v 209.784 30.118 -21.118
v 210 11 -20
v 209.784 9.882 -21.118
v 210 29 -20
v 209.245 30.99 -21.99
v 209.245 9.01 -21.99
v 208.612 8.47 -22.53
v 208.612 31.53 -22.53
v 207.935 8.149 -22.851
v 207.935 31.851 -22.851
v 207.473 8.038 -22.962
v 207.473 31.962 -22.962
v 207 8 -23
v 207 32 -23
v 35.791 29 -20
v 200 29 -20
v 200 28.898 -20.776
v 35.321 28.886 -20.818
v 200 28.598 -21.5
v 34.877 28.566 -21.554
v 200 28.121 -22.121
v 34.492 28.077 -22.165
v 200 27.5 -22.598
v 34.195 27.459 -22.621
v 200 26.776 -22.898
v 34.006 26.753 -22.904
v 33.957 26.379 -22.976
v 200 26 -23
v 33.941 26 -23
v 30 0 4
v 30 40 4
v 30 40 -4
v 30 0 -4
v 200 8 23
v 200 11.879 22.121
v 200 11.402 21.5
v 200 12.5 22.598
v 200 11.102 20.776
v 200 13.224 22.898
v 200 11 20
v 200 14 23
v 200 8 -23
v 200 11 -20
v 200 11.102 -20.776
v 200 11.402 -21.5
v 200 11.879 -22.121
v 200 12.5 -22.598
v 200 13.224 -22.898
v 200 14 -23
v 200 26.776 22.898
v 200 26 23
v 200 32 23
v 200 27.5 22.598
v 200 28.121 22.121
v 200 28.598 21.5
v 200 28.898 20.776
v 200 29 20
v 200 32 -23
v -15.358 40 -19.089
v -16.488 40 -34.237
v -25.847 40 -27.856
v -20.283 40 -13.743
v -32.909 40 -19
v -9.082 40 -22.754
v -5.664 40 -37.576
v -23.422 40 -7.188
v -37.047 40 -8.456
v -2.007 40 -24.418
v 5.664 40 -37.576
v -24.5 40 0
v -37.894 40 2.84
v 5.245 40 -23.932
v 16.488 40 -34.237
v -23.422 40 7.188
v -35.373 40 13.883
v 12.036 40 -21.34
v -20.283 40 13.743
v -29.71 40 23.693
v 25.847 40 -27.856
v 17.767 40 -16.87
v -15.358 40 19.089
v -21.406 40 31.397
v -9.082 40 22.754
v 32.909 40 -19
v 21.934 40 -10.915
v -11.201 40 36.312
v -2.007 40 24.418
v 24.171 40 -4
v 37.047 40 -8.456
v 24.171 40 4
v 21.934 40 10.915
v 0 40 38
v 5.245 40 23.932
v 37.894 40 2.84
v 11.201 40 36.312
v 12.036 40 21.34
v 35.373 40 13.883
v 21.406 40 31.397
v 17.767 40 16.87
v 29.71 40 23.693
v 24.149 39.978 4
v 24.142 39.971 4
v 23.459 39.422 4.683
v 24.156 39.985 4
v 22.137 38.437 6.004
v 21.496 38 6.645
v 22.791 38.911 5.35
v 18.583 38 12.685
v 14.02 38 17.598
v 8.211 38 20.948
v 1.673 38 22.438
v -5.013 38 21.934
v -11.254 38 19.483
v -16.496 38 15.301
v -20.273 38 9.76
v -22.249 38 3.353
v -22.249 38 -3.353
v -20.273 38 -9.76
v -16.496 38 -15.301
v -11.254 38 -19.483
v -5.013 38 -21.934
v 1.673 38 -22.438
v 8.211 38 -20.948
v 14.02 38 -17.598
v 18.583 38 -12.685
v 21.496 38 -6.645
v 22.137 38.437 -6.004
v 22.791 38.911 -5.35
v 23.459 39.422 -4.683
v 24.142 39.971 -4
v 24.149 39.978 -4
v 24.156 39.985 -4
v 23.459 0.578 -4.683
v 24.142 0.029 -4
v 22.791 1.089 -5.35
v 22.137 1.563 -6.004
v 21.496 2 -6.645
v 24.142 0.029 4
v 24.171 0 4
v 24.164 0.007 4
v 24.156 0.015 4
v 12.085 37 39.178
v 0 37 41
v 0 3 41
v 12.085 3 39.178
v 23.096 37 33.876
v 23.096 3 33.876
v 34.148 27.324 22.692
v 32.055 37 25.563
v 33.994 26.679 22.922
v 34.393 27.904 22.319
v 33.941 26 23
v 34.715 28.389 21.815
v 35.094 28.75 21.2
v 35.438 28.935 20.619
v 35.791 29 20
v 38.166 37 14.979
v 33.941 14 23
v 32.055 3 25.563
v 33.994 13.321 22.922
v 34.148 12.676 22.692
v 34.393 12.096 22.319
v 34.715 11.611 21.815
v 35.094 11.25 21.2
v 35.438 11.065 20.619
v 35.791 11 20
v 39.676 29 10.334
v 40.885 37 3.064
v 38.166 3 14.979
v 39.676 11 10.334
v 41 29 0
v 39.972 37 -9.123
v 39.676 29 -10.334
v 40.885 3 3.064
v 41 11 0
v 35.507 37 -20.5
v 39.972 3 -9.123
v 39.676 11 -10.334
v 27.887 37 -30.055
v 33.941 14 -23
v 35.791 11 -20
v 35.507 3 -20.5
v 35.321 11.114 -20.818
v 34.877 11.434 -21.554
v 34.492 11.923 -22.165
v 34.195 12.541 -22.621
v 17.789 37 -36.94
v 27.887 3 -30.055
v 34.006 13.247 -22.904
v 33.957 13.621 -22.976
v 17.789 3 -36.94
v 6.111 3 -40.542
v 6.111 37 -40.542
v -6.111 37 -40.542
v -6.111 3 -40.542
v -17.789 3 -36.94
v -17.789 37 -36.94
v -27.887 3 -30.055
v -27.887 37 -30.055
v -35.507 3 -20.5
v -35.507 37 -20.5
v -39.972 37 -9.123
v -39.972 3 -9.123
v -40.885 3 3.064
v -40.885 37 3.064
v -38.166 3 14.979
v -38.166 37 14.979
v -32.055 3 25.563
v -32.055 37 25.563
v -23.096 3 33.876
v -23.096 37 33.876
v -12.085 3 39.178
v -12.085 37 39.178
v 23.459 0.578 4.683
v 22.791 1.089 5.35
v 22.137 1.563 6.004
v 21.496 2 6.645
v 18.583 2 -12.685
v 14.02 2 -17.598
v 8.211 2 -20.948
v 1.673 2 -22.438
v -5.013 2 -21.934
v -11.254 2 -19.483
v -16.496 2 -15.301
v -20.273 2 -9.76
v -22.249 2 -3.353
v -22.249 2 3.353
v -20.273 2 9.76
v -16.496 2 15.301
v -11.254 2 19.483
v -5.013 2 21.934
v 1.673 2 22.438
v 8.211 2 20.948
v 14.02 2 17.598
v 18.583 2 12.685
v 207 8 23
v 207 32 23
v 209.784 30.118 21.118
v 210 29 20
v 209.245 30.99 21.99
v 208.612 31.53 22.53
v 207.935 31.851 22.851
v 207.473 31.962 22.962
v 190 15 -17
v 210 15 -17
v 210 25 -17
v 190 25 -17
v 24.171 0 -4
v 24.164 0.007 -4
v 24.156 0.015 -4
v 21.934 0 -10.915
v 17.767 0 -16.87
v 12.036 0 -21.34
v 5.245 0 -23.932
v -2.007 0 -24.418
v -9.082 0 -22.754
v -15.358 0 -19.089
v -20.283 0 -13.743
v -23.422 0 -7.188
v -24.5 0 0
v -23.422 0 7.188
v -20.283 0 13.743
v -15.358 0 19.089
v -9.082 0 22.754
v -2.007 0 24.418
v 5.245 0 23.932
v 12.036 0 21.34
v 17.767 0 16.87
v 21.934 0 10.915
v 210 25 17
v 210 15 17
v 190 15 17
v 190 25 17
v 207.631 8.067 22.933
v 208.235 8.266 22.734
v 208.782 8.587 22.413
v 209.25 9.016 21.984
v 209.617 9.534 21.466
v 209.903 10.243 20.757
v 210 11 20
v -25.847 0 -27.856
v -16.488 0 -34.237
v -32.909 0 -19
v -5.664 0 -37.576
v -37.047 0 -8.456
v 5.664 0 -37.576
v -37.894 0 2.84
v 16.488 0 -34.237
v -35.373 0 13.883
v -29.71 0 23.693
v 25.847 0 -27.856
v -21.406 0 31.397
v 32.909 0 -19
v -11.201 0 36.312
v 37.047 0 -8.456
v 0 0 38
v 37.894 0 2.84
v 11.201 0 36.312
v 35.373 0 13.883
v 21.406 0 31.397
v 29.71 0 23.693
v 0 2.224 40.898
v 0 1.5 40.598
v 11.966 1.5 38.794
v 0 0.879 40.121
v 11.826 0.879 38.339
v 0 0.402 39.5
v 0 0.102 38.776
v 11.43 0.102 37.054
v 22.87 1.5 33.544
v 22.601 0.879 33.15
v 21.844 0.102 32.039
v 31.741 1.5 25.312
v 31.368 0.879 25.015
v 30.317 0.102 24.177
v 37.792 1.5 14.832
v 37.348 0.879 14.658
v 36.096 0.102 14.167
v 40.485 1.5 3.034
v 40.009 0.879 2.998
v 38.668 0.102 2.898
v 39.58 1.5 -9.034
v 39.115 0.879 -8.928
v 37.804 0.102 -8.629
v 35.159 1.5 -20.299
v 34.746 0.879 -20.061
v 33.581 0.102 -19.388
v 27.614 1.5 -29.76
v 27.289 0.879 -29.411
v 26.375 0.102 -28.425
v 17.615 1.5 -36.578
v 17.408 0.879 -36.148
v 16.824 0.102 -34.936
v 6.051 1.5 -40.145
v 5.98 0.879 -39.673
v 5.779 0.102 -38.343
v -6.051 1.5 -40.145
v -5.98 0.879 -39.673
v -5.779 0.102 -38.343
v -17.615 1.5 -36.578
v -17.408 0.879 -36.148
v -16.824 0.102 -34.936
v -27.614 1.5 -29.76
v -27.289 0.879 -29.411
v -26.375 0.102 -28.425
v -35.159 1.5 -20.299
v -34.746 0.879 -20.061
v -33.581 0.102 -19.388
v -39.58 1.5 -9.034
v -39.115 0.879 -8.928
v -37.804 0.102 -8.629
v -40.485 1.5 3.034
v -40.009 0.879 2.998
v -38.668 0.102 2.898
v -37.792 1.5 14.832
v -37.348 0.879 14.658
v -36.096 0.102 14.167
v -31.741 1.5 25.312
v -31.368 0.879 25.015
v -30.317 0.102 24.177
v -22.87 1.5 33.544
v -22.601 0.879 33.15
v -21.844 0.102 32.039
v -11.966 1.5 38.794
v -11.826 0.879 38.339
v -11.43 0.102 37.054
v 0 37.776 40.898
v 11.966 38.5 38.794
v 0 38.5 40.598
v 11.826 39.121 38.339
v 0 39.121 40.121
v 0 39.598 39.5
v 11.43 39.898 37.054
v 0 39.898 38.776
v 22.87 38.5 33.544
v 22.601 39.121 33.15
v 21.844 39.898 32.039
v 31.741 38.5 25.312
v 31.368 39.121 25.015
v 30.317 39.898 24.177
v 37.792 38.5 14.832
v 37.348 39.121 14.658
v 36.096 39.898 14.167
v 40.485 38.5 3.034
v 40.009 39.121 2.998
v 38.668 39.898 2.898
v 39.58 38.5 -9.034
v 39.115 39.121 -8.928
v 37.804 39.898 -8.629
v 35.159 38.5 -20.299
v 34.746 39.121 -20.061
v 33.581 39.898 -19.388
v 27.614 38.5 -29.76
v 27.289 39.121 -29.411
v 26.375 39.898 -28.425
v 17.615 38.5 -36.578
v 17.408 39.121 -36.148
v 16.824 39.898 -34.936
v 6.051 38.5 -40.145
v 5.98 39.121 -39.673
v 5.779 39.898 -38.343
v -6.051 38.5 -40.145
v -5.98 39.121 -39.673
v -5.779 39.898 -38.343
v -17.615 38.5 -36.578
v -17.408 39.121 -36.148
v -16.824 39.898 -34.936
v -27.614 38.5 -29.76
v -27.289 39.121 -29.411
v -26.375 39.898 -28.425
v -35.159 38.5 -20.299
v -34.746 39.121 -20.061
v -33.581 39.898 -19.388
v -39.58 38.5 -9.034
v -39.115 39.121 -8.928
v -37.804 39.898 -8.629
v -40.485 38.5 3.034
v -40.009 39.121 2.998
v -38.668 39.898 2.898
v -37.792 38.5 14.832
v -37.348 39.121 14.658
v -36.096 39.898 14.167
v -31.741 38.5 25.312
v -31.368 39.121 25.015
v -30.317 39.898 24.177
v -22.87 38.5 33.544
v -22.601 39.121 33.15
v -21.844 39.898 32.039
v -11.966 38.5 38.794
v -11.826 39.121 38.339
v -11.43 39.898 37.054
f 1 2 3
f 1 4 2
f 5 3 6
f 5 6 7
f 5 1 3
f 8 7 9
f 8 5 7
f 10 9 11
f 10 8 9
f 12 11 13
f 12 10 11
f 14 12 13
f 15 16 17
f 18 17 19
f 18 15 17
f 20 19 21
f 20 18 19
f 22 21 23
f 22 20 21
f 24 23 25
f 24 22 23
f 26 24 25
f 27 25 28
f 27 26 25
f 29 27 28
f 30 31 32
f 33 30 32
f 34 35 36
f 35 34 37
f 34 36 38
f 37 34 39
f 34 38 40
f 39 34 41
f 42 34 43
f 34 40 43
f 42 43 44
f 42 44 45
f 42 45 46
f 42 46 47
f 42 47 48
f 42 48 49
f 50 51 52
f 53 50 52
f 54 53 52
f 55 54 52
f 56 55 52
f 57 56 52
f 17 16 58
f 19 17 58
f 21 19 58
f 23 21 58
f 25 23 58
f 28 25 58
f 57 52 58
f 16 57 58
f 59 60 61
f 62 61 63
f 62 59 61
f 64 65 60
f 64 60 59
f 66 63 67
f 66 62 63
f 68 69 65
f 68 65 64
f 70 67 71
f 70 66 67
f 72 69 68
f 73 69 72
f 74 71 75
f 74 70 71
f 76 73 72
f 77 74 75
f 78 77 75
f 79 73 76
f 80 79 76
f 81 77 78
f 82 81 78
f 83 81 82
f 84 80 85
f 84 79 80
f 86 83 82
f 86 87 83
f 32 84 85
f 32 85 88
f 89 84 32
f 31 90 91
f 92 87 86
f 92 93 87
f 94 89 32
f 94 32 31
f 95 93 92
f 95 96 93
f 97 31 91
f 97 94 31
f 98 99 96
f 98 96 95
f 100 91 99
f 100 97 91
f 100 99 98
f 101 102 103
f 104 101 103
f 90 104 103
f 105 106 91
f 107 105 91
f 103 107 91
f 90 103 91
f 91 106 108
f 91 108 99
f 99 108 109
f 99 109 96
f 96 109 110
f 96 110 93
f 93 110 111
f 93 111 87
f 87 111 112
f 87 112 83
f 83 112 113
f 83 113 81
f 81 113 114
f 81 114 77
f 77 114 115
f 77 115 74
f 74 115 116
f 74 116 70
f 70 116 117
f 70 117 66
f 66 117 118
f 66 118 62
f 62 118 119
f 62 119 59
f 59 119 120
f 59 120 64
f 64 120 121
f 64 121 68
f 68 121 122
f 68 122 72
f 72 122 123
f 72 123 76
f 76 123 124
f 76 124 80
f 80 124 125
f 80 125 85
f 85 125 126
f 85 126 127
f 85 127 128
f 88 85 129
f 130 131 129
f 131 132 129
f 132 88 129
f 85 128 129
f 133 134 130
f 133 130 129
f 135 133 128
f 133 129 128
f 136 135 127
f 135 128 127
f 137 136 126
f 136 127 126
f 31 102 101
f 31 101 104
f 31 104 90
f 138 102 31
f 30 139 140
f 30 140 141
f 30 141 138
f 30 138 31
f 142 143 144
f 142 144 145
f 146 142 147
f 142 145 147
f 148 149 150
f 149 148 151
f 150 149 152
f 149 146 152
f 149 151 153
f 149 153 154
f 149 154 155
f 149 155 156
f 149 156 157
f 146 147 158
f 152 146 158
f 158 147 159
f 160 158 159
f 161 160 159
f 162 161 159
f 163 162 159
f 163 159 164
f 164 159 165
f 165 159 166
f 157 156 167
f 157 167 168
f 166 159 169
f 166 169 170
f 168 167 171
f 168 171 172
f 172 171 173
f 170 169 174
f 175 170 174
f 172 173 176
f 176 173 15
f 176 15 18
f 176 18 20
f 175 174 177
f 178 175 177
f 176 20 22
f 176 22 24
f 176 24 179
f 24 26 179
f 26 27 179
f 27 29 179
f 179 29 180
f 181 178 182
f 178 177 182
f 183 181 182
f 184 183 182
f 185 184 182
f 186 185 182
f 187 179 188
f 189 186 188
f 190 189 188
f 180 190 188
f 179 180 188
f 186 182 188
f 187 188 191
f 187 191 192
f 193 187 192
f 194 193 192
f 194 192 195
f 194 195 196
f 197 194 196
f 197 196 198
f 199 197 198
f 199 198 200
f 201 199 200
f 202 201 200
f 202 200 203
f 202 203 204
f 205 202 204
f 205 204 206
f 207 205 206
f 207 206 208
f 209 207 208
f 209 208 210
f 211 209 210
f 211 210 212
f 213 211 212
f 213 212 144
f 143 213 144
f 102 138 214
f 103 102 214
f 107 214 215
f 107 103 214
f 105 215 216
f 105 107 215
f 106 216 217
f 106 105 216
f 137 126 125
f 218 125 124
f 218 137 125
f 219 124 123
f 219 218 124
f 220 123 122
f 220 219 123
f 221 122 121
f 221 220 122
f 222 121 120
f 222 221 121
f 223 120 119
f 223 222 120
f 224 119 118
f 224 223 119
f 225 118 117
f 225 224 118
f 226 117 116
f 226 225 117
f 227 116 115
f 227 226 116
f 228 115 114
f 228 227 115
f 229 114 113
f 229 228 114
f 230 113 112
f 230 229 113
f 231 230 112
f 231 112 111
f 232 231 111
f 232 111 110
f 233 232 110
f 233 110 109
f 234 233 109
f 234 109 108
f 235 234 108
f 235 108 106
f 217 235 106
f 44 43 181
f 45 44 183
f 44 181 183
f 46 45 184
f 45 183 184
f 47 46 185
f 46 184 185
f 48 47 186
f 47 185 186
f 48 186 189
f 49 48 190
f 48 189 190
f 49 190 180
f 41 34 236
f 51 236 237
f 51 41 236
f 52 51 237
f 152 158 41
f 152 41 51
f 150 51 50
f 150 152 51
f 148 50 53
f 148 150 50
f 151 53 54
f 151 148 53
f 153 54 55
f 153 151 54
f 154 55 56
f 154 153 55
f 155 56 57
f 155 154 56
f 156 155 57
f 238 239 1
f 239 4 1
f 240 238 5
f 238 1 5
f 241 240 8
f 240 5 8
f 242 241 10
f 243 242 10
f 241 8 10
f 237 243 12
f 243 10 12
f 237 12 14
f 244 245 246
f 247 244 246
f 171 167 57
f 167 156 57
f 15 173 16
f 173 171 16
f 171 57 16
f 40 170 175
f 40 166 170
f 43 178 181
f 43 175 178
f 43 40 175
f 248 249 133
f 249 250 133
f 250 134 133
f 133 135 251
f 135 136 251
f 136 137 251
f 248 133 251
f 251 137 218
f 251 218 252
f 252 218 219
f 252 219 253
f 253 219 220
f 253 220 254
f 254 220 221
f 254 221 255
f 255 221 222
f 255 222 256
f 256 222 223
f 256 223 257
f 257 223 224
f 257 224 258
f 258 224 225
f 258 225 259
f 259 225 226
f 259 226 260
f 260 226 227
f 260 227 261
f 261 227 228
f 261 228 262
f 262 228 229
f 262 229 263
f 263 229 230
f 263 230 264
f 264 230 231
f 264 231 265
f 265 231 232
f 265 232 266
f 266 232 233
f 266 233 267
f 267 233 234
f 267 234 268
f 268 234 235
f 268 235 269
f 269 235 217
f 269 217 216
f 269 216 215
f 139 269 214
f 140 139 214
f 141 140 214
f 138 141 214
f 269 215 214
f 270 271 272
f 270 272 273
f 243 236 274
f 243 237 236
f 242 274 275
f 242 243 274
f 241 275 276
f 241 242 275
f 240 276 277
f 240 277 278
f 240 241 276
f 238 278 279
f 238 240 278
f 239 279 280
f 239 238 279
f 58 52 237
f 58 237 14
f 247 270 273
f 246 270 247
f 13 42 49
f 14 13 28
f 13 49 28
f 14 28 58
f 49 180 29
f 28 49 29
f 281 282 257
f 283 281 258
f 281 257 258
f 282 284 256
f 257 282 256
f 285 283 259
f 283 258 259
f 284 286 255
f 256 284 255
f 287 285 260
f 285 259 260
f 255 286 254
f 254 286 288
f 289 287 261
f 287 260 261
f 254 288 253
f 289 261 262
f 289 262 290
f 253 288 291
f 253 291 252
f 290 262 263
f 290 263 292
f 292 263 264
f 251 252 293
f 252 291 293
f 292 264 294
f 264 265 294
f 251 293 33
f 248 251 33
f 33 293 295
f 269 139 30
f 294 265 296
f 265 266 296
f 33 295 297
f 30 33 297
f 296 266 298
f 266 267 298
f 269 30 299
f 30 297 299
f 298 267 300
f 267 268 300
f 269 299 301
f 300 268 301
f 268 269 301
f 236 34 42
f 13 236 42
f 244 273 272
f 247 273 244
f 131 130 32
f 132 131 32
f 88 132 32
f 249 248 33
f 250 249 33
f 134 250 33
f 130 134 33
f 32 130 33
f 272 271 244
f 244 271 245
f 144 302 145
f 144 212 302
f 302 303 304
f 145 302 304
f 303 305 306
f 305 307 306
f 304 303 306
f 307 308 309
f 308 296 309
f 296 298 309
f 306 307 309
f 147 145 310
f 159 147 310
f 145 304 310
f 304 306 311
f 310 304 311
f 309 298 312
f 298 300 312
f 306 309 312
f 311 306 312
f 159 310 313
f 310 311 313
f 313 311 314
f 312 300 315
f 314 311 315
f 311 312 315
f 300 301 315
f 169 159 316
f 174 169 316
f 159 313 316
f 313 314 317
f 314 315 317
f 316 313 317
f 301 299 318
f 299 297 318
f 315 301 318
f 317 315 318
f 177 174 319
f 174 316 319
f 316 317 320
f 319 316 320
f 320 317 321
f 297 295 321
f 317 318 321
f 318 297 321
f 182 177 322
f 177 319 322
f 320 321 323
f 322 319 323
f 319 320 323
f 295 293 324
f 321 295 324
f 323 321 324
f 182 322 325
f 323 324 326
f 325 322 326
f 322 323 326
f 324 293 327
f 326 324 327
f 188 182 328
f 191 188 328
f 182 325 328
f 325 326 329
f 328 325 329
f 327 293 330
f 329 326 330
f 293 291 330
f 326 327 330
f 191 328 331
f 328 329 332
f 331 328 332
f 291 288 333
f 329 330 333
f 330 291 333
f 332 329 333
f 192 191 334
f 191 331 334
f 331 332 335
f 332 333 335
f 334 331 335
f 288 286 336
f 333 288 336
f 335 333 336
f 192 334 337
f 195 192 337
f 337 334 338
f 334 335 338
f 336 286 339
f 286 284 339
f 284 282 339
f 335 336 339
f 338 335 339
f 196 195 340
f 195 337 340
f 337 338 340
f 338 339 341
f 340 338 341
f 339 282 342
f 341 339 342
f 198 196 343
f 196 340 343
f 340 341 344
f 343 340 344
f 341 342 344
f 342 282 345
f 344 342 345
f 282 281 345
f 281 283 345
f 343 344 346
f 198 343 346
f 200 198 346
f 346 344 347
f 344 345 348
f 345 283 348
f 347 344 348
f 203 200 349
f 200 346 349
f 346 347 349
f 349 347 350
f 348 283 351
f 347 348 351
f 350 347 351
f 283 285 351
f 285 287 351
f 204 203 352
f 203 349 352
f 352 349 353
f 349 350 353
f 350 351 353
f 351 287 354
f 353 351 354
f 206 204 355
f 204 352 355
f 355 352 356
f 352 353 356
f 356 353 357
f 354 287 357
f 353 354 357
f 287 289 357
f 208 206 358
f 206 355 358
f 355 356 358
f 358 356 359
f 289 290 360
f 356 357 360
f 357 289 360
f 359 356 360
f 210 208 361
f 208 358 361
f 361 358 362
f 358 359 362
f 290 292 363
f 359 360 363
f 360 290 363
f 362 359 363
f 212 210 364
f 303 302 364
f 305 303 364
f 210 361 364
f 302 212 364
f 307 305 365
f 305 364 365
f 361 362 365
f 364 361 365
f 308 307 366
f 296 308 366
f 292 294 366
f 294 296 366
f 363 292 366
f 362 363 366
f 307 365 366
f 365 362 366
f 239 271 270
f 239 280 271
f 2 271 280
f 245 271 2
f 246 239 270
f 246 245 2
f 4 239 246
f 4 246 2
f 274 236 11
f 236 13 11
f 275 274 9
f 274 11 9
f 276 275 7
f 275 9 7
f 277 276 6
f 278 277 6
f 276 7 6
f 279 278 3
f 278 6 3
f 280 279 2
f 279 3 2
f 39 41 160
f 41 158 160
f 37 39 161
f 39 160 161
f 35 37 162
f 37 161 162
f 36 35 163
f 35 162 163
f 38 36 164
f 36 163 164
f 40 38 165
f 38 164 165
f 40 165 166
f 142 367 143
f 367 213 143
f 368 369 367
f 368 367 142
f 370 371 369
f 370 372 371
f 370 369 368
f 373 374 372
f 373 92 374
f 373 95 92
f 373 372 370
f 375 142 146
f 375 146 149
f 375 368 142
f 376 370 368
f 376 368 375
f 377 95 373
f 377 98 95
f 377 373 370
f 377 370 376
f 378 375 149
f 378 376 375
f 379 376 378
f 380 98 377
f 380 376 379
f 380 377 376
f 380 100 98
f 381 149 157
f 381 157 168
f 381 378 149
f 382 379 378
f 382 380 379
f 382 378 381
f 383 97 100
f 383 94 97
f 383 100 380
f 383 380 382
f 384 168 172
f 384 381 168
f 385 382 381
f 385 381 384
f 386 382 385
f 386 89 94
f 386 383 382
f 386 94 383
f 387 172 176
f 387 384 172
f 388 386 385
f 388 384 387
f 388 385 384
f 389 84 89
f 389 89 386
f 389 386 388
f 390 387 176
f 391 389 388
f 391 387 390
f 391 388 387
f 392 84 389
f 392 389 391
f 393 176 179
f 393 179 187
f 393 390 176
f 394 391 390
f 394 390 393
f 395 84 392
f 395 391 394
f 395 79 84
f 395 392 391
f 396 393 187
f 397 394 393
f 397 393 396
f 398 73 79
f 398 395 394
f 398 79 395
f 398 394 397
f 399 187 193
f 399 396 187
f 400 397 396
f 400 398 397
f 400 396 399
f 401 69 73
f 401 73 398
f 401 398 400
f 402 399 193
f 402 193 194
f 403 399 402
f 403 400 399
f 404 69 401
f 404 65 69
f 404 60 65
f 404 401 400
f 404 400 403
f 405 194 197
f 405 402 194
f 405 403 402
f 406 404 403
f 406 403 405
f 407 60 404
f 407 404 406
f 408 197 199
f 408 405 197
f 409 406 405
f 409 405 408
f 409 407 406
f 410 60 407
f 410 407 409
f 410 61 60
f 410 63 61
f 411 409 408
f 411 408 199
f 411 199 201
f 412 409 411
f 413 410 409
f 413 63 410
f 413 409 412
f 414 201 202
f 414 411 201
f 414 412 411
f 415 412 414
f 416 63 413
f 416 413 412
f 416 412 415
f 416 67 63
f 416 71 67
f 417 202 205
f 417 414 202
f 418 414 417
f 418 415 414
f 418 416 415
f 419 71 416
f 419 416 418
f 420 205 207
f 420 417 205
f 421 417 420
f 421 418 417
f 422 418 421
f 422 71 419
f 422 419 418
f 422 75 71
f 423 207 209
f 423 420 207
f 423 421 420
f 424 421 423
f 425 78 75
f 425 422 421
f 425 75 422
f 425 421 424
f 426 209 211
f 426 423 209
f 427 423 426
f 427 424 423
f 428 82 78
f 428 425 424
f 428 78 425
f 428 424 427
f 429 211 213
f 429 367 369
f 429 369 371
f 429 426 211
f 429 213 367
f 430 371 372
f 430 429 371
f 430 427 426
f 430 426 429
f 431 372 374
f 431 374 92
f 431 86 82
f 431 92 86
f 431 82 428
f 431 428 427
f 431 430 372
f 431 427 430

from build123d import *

# Parameters (mm, degrees)
SKETCH_1_R           = 41
SKETCH_1_R_2         = 22.5
EXTRUDE_1_DEPTH      = 40
SKETCH_2_W           = 46
SKETCH_2_H           = 24
EXTRUDE_2_DEPTH      = 10
EXTRUDE_3_REACH      = 249.714
EXTRUDE_3_END_RADIUS = 41
SKETCH_3_W           = 46
SKETCH_3_H           = 18
SKETCH_4_W           = 40.100646326
SKETCH_4_H           = 8
CUT_EXTRUDE_1_DEPTH  = 218.671771252
SKETCH_5_W           = 34
SKETCH_5_H           = 10
CUT_EXTRUDE_2_DEPTH  = 10
FILLET_1_R           = 3
CHAMFER_1_SIZE       = 2


with BuildPart() as part:
    # 草图1 → 凸台-拉伸1 (new body)
    with BuildSketch(Plane(origin=(0, 0, 0), x_dir=(1, 0, 0), z_dir=(0, 1, 0))):
        with Locations(Location((0, 0, 0), (0, 0, 270))):
            Circle(SKETCH_1_R)
        with Locations(Location((0, 0, 0), (0, 0, 270))):
            Circle(SKETCH_1_R_2, mode=Mode.SUBTRACT)
    extrude(amount=EXTRUDE_1_DEPTH)



with BuildPart() as body_2:
    # 草图2 → 凸台-拉伸2 (new body)
    with BuildSketch(Plane(origin=(200, 0, 0), x_dir=(0, 0, -1), z_dir=(1, 0, 0))):
        with Locations((0, 20)):
            Rectangle(SKETCH_2_W, SKETCH_2_H)
    extrude(amount=EXTRUDE_2_DEPTH)


with BuildPart() as part_1:
    add(part.part)

    add(body_2.part)  # 凸台-拉伸3 merges body 2
    # 凸台-拉伸3: up to this cylinder (the profile starts outside it)
    extrude_3_end = Plane(origin=(0, 20, 0), z_dir=(0, -1, 0)) * Cylinder(EXTRUDE_3_END_RADIUS, 582.428, mode=Mode.PRIVATE)
    # 草图3 → 凸台-拉伸3 (add, up to the surface)
    with BuildSketch(Plane(origin=(200, 0, 0), x_dir=(0, 0, -1), z_dir=(1, 0, 0)), mode=Mode.PRIVATE) as extrude_3_sk1:
        with Locations((0, 20)):
            Rectangle(SKETCH_3_W, SKETCH_3_H)
    extrude_3_tool1 = extrude(extrude_3_sk1.sketch, amount=-EXTRUDE_3_REACH, mode=Mode.PRIVATE) - extrude_3_end
    add(extrude_3_tool1.solids().sort_by_distance((200, 20, 0))[0])

    # 草图4 → 切除-拉伸1 (cut, through all)
    with BuildSketch(Plane(origin=(0, 0, 0), x_dir=(1, 0, 0), z_dir=(0, 1, 0))):
        with Locations((9.949676837, 0)):
            Rectangle(SKETCH_4_W, SKETCH_4_H)
    extrude(amount=CUT_EXTRUDE_1_DEPTH, mode=Mode.SUBTRACT)

    # 草图5 → 切除-拉伸2 (cut, symmetric)
    with BuildSketch(Plane(origin=(200, 0, 0), x_dir=(0, 0, -1), z_dir=(1, 0, 0))):
        with Locations((0, 20)):
            Rectangle(SKETCH_5_W, SKETCH_5_H)
    extrude(amount=CUT_EXTRUDE_2_DEPTH, both=True, mode=Mode.SUBTRACT)

    # 圆角1
    fillet_1_edges = [part_1.edges().sort_by_distance(p)[0] for p in [
        (116.970562748, 29, 23),
        (116.970562748, 11, 23),
        (116.970562748, 11, -23),
        (116.970562748, 29, -23),
        (0, 0, -41),
        (210, 20, -23),
        (210, 32, 0),
        (210, 20, 23),
        (210, 8, 0),
        (0, 40, -41),
    ]]
    fillet(fillet_1_edges, radius=FILLET_1_R)

    # 倒角1
    # the kernel refuses this chamfer: 2.480488228, 2 mm, written as the material it takes off along each edge
    with BuildSketch(Plane(origin=(22.141589825, 47.02037687, 4), x_dir=(1, 0, 0), z_dir=(0, -1, 0))) as chamfer_1_piece_1:
        with BuildLine():
            Line((CHAMFER_1_SIZE, 0), (-0.645316442, 2.645316442))
            ThreePointArc((-0.645316442, 2.645316442), (-0.292721572, 1.373728317), (0, 0))
            Line((0, 0), (CHAMFER_1_SIZE, 0))
        make_face()
    extrude(amount=54.040753739, mode=Mode.SUBTRACT)
    with BuildSketch(Plane(origin=(22.141589825, 47.02037687, -4), x_dir=(1, 0, 0), z_dir=(0, -1, 0))) as chamfer_1_piece_2:
        with BuildLine():
            Line((CHAMFER_1_SIZE, 0), (-0.645316442, -2.645316442))
            ThreePointArc((-0.645316442, -2.645316442), (-0.292721572, -1.373728317), (0, 0))
            Line((0, 0), (CHAMFER_1_SIZE, 0))
        make_face()
    extrude(amount=54.040753739, mode=Mode.SUBTRACT)
    # the kernel refuses this chamfer: 2.480488228, 2 mm, written as the material it takes off along each edge
    with BuildSketch(Plane(origin=(0, 40, 0), x_dir=(0.9975496866331381, 0, 0.06996158015745366), z_dir=(0.06996158015745366, 0, -0.9975496866331381))) as chamfer_1_2_piece_1:
        Polygon((22.5 + CHAMFER_1_SIZE, 0), (22.5, CHAMFER_1_SIZE), (22.5, 0), align=None)
    revolve(axis=Axis((0, 40, 0), (0, -1, 0)), revolution_arc=351.976438974, mode=Mode.SUBTRACT)
    with BuildSketch(Plane(origin=(0, 0, 0), x_dir=(0.9975496866331381, 0, -0.06996158015745378), z_dir=(0.06996158015745378, 0, 0.9975496866331381))) as chamfer_1_2_piece_2:
        Polygon((22.5 + CHAMFER_1_SIZE, 0), (22.5, CHAMFER_1_SIZE), (22.5, 0), align=None)
    revolve(axis=Axis((0, 0, 0), (0, 1, 0)), revolution_arc=351.976438974, mode=Mode.SUBTRACT)


solid = part_1.part
